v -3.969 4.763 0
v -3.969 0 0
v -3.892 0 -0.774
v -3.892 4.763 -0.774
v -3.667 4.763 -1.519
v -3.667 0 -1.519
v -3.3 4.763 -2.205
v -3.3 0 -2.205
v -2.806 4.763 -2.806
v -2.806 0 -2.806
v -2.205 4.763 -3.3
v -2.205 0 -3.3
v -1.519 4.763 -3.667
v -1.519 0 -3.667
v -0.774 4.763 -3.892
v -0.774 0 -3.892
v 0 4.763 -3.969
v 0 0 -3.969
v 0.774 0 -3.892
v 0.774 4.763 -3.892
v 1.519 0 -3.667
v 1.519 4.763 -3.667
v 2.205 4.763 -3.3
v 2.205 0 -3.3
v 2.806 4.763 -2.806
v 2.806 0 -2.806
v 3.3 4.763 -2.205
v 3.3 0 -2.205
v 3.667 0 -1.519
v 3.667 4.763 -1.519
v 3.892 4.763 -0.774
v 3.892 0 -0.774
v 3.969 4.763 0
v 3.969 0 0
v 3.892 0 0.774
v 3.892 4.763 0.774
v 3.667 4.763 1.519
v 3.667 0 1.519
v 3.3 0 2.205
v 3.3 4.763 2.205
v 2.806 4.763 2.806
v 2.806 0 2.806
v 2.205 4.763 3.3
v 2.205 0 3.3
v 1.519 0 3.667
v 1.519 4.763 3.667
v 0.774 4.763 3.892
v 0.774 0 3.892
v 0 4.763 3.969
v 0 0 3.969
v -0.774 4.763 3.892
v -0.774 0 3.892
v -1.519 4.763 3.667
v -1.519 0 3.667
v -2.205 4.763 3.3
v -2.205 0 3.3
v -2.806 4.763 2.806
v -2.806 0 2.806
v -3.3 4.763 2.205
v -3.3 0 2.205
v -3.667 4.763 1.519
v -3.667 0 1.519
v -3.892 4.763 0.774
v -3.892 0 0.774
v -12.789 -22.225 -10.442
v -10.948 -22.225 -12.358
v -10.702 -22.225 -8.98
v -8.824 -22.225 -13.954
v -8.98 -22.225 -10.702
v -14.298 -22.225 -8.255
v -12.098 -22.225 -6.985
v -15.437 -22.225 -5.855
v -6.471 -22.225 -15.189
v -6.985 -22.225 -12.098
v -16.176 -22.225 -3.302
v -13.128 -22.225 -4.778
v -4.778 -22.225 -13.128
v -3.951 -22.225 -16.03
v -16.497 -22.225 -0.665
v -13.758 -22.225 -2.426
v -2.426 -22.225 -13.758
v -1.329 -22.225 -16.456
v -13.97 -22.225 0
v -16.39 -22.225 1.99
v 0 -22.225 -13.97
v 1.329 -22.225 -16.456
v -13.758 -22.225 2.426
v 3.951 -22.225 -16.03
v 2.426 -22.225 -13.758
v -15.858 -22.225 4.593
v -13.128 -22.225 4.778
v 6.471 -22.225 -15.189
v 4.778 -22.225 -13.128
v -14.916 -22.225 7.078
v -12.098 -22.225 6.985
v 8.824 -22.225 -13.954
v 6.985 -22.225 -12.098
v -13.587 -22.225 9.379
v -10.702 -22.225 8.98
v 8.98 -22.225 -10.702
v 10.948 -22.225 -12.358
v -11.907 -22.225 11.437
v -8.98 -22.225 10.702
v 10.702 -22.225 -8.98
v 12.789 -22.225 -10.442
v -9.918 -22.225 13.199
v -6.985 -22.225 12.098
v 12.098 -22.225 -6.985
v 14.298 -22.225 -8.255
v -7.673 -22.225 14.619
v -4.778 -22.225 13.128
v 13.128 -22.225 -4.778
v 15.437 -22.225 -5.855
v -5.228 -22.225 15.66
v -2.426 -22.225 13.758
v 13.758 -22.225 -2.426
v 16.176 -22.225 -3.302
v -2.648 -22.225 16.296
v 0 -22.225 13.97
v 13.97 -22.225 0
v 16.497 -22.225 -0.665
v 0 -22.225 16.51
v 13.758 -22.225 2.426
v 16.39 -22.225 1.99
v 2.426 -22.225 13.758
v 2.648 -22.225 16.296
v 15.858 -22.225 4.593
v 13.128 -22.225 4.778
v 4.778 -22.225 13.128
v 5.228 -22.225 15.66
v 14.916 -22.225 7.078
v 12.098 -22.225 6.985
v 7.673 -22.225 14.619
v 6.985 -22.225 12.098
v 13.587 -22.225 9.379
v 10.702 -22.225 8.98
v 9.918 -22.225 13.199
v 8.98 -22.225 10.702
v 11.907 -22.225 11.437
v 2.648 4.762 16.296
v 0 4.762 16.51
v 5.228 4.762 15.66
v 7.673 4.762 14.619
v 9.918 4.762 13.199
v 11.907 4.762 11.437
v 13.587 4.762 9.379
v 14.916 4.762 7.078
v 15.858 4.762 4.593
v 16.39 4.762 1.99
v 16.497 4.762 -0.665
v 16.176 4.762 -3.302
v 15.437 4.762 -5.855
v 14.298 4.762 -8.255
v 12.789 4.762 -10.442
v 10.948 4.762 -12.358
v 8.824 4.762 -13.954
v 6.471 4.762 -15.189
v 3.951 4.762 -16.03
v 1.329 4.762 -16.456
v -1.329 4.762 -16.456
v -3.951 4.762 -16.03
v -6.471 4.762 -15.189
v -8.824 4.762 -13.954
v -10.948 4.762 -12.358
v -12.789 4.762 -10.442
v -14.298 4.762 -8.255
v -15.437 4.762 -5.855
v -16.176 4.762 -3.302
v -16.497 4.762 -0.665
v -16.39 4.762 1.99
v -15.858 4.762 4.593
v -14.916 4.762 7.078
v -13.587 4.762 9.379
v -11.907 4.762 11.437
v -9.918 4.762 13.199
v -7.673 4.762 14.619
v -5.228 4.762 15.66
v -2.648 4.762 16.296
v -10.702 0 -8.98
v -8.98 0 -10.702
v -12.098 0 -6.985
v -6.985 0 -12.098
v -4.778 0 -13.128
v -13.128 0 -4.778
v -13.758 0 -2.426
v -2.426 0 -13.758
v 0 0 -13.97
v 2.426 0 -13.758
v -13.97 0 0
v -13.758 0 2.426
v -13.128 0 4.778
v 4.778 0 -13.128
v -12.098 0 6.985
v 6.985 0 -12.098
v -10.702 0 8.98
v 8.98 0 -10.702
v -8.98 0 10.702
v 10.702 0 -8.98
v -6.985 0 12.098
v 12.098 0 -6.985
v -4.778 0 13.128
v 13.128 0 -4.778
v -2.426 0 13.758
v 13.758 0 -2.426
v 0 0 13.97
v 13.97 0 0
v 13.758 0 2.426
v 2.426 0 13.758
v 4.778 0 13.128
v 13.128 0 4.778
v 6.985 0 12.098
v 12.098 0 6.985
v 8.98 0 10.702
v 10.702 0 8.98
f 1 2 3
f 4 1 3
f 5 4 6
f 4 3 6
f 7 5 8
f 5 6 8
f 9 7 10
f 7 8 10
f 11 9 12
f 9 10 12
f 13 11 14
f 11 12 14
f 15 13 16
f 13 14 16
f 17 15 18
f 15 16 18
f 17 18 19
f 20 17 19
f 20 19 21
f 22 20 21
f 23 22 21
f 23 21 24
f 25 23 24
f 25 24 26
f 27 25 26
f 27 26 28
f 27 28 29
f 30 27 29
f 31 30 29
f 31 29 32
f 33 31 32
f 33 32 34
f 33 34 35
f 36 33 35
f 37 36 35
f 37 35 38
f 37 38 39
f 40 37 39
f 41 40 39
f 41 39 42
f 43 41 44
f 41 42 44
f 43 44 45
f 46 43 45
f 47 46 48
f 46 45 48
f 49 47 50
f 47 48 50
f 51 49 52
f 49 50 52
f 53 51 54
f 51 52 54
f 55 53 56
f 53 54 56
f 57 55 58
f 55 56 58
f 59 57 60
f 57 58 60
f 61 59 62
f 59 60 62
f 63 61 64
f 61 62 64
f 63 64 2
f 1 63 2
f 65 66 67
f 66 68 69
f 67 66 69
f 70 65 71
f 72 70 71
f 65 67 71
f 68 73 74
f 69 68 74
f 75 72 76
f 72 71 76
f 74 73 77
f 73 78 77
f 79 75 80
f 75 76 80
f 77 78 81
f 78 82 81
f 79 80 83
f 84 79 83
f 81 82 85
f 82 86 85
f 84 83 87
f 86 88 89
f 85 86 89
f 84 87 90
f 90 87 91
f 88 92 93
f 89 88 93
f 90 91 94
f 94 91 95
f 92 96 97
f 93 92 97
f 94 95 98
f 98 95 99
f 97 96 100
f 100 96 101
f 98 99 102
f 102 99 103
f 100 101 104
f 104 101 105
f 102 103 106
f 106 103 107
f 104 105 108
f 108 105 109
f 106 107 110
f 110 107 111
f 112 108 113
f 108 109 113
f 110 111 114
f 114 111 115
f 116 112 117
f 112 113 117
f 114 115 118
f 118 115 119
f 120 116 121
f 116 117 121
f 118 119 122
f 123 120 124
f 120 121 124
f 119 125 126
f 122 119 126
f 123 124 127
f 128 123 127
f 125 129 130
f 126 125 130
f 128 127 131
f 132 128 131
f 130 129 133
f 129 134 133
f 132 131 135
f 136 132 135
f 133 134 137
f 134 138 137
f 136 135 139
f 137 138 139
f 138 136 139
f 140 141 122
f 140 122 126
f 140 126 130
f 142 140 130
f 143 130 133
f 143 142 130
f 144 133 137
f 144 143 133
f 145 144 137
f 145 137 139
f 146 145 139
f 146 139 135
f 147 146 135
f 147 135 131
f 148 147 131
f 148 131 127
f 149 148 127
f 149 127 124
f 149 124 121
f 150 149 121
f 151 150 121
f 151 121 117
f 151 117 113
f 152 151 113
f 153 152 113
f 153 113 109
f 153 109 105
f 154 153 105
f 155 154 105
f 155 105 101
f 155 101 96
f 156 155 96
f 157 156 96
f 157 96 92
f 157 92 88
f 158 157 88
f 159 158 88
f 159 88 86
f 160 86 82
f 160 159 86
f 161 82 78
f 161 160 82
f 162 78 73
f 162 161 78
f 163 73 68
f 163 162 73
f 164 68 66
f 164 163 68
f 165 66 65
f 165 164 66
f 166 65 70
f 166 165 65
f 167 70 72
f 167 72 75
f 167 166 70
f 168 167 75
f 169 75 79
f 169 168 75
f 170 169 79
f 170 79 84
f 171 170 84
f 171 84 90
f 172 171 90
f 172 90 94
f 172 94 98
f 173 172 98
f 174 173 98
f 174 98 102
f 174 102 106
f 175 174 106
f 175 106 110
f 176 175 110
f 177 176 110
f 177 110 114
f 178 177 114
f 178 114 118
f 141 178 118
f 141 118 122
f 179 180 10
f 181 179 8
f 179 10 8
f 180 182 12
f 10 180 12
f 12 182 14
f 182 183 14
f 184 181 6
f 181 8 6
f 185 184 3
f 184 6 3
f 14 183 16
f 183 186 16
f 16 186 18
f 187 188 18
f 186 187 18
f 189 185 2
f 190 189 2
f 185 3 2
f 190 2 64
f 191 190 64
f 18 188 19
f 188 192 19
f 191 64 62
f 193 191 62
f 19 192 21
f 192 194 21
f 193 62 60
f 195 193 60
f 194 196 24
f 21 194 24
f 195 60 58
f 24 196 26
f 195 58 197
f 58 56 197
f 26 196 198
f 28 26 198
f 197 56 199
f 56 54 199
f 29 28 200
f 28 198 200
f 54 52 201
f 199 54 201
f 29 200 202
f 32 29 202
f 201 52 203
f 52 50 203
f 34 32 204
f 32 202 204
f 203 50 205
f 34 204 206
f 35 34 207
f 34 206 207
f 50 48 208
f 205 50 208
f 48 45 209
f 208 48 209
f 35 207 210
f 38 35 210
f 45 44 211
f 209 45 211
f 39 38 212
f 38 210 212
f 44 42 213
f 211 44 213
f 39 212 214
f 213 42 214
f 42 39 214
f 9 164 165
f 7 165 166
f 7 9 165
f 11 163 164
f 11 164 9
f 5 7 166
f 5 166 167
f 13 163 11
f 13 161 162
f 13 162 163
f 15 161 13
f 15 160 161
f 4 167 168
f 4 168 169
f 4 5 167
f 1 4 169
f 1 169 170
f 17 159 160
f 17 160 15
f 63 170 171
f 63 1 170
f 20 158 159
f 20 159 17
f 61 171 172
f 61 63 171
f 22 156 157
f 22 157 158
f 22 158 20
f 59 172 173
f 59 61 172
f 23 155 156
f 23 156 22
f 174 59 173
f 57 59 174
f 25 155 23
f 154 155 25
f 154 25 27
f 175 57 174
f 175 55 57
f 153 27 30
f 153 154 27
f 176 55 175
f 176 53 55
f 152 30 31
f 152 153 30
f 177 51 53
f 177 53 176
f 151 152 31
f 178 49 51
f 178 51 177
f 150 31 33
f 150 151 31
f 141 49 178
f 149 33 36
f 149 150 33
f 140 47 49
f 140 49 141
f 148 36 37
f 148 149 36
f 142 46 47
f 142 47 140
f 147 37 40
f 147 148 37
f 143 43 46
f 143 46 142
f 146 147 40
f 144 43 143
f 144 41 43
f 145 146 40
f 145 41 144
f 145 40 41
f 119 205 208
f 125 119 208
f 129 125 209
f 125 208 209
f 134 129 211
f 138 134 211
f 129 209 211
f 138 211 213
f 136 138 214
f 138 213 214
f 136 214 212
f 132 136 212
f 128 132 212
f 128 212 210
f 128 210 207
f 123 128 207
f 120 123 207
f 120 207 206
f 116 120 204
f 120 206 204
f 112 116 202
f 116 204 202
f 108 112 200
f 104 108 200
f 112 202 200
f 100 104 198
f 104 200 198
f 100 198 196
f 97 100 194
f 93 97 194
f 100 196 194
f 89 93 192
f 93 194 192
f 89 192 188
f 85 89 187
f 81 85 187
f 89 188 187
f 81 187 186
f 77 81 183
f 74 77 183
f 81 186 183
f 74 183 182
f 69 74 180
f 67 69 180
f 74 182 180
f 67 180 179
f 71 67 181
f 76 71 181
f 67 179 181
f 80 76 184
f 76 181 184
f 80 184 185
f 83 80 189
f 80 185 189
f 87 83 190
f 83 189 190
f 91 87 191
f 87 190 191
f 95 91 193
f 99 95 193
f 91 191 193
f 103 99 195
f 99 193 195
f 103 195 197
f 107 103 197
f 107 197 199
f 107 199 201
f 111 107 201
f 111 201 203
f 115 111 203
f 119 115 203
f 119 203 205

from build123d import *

# Parameters (mm, degrees)
SKETCH1_R                      = 16.51
SKETCH1_R_2                    = 13.97
BOSS_EXTRUDE1_DEPTH            = 22.225
BOSS_EXTRUDE2_START            = 4.7625
SKETCH1_2_R                    = 16.51
BOSS_EXTRUDE2_DEPTH            = 4.7625
F_5_16_0_3125_DIAMETER_HOLE1_D = 7.9375


with BuildPart() as part:
    # Sketch1 → Boss-Extrude1 (new body)
    with BuildSketch(Plane(origin=(0, 0, 0), x_dir=(1, 0, 0), z_dir=(0, 1, 0))):
        with Locations(Location((0, 0, 0), (0, 0, 270))):
            Circle(SKETCH1_R)
        with Locations(Location((0, 0, 0), (0, 0, 270))):
            Circle(SKETCH1_R_2, mode=Mode.SUBTRACT)
    extrude(amount=-BOSS_EXTRUDE1_DEPTH)

    # Sketch1<2> → Boss-Extrude2 (add)
    with BuildSketch(Plane(origin=(0, 0, 0), x_dir=(1, 0, 0), z_dir=(0, 1, 0)).offset(BOSS_EXTRUDE2_START)):
        with Locations(Location((0, 0, 0), (0, 0, 270))):
            Circle(SKETCH1_2_R)
    extrude(amount=-BOSS_EXTRUDE2_DEPTH)

    # 5/16 (0.3125) Diameter Hole1 (through all)
    with Locations(Plane(origin=(0, 4.7625, 0), x_dir=(1, 0, 0), z_dir=(0, 1, 0))):
        with Locations((0, 0)):
            Hole(F_5_16_0_3125_DIAMETER_HOLE1_D / 2)


solid = part.part
